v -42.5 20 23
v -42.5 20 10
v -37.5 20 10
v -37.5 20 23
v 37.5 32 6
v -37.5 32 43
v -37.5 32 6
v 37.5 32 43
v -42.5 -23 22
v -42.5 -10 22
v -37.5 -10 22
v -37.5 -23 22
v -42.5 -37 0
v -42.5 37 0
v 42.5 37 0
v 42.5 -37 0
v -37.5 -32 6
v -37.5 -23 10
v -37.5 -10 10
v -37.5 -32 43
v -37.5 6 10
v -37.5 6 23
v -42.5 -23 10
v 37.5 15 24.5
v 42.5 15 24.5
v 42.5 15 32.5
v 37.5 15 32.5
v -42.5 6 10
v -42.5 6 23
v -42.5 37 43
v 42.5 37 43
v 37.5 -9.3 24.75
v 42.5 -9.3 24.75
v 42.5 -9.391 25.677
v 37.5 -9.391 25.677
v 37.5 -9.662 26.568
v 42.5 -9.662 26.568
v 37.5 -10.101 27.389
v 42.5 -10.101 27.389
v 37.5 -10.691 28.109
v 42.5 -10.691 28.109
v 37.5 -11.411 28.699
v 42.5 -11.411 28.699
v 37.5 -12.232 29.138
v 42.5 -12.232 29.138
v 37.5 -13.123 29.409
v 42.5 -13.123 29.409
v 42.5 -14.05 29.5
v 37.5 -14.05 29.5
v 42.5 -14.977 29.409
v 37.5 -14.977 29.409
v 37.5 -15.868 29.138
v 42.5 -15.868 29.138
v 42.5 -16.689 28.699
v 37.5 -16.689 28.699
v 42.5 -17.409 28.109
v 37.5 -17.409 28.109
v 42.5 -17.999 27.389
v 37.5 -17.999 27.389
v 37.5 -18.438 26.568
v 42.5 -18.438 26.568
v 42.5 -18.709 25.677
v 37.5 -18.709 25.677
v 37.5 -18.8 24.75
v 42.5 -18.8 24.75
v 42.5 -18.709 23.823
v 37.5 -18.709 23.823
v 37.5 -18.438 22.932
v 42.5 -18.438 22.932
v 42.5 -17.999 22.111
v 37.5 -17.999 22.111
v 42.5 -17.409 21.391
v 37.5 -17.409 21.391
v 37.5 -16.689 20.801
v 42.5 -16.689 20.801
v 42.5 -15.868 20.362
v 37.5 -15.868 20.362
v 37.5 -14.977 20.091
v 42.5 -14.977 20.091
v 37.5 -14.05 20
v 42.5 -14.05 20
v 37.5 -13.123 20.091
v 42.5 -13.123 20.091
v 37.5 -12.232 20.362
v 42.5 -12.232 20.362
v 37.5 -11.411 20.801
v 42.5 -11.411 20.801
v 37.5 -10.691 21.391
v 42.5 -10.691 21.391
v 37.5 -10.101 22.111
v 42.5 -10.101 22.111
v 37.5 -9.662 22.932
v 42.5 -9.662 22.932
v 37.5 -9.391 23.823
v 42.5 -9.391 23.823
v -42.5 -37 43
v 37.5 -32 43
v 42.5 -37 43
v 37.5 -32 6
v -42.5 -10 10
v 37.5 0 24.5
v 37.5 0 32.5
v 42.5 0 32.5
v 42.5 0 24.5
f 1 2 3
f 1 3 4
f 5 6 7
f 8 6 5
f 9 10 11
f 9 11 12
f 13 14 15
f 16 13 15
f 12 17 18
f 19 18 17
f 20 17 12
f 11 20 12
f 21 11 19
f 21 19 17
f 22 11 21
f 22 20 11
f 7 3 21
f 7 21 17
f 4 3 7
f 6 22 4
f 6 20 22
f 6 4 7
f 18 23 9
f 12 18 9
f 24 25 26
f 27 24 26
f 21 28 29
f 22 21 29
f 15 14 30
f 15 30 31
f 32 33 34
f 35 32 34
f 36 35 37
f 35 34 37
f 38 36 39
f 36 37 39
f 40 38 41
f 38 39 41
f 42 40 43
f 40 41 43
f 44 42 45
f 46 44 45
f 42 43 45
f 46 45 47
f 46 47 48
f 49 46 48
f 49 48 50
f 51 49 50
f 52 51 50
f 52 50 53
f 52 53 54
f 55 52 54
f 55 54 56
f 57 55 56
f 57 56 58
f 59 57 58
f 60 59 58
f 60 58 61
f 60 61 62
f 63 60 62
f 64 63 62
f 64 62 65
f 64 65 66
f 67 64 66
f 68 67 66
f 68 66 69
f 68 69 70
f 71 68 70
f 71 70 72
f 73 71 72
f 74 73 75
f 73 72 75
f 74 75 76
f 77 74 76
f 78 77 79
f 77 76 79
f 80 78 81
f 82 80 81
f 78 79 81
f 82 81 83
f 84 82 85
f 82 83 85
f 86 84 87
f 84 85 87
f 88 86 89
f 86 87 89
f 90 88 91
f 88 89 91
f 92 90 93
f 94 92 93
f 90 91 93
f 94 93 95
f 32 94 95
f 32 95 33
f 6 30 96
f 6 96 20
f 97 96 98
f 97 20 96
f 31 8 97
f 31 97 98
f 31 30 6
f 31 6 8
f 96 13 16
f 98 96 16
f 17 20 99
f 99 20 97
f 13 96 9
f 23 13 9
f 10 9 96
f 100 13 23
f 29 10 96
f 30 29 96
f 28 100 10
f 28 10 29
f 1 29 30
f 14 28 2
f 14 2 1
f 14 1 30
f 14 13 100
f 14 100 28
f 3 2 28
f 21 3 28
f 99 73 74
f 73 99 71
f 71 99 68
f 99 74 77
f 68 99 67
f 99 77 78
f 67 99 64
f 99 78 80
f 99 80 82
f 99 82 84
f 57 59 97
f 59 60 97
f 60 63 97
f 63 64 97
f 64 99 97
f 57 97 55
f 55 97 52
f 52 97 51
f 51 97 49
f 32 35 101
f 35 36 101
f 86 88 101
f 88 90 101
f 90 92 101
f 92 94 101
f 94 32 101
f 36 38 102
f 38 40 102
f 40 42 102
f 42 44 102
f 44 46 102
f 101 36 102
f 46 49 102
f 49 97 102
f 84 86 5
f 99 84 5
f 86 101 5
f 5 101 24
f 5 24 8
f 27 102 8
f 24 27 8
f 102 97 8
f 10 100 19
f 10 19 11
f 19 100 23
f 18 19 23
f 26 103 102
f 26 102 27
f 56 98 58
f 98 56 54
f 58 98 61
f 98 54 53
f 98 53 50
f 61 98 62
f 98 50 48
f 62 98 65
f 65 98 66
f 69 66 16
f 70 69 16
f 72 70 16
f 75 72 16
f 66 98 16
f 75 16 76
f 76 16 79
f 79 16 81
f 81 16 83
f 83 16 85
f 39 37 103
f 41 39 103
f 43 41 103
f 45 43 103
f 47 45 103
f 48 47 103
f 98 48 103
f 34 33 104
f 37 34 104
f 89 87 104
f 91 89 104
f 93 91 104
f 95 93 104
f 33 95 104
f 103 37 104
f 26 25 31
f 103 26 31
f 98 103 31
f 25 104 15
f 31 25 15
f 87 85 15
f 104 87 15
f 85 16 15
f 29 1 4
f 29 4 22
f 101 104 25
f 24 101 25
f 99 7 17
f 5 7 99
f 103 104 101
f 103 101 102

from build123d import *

# Parameters (mm, degrees)
F0_W      = 85
F0_H      = 74
F1_DEPTH  = 43
F2_W      = 75
F2_H      = 64
F3_DEPTH  = 37
F4_W      = 15
F4_H      = 8
F5_DEPTH  = 6
F6_R      = 4.75
F7_DEPTH  = 6
F8_W      = 14
F8_H      = 13
F9_DEPTH  = 6
F10_W     = 13
F10_H     = 12
F11_DEPTH = 6


with BuildPart() as f1:
    # F0 (on Top) → F1 (new body)
    with BuildSketch(Plane.XY):
        Rectangle(F0_W, F0_H)
    extrude(amount=F1_DEPTH)

    # F2 (on face) → F3 (cut)
    with BuildSketch(Plane.XY.offset(43)):
        Rectangle(F2_W, F2_H)
    extrude(amount=-F3_DEPTH, mode=Mode.SUBTRACT)

    # F4 (on face) → F5 (cut)
    with BuildSketch(Plane.YZ.offset(42.5)):
        with Locations((7.5, 28.5)):
            Rectangle(F4_W, F4_H)
    extrude(amount=-F5_DEPTH, mode=Mode.SUBTRACT)

    # F6 (on face) → F7 (cut)
    with BuildSketch(Plane.YZ.offset(42.5)):
        with Locations((-14.05, 24.75)):
            Circle(F6_R)
    extrude(amount=-F7_DEPTH, mode=Mode.SUBTRACT)

    # F8 (on face) → F9 (cut)
    with BuildSketch(Plane(origin=(-42.5, 0, 0), x_dir=(0, -1, 0), z_dir=(-1, 0, 0))):
        with Locations((-13, 16.5)):
            Rectangle(F8_W, F8_H)
    extrude(amount=-F9_DEPTH, mode=Mode.SUBTRACT)

    # F10 (on face) → F11 (cut)
    with BuildSketch(Plane(origin=(-42.5, 0, 0), x_dir=(0, -1, 0), z_dir=(-1, 0, 0))):
        with Locations((16.5, 16)):
            Rectangle(F10_W, F10_H)
    extrude(amount=-F11_DEPTH, mode=Mode.SUBTRACT)


solid = f1.part
